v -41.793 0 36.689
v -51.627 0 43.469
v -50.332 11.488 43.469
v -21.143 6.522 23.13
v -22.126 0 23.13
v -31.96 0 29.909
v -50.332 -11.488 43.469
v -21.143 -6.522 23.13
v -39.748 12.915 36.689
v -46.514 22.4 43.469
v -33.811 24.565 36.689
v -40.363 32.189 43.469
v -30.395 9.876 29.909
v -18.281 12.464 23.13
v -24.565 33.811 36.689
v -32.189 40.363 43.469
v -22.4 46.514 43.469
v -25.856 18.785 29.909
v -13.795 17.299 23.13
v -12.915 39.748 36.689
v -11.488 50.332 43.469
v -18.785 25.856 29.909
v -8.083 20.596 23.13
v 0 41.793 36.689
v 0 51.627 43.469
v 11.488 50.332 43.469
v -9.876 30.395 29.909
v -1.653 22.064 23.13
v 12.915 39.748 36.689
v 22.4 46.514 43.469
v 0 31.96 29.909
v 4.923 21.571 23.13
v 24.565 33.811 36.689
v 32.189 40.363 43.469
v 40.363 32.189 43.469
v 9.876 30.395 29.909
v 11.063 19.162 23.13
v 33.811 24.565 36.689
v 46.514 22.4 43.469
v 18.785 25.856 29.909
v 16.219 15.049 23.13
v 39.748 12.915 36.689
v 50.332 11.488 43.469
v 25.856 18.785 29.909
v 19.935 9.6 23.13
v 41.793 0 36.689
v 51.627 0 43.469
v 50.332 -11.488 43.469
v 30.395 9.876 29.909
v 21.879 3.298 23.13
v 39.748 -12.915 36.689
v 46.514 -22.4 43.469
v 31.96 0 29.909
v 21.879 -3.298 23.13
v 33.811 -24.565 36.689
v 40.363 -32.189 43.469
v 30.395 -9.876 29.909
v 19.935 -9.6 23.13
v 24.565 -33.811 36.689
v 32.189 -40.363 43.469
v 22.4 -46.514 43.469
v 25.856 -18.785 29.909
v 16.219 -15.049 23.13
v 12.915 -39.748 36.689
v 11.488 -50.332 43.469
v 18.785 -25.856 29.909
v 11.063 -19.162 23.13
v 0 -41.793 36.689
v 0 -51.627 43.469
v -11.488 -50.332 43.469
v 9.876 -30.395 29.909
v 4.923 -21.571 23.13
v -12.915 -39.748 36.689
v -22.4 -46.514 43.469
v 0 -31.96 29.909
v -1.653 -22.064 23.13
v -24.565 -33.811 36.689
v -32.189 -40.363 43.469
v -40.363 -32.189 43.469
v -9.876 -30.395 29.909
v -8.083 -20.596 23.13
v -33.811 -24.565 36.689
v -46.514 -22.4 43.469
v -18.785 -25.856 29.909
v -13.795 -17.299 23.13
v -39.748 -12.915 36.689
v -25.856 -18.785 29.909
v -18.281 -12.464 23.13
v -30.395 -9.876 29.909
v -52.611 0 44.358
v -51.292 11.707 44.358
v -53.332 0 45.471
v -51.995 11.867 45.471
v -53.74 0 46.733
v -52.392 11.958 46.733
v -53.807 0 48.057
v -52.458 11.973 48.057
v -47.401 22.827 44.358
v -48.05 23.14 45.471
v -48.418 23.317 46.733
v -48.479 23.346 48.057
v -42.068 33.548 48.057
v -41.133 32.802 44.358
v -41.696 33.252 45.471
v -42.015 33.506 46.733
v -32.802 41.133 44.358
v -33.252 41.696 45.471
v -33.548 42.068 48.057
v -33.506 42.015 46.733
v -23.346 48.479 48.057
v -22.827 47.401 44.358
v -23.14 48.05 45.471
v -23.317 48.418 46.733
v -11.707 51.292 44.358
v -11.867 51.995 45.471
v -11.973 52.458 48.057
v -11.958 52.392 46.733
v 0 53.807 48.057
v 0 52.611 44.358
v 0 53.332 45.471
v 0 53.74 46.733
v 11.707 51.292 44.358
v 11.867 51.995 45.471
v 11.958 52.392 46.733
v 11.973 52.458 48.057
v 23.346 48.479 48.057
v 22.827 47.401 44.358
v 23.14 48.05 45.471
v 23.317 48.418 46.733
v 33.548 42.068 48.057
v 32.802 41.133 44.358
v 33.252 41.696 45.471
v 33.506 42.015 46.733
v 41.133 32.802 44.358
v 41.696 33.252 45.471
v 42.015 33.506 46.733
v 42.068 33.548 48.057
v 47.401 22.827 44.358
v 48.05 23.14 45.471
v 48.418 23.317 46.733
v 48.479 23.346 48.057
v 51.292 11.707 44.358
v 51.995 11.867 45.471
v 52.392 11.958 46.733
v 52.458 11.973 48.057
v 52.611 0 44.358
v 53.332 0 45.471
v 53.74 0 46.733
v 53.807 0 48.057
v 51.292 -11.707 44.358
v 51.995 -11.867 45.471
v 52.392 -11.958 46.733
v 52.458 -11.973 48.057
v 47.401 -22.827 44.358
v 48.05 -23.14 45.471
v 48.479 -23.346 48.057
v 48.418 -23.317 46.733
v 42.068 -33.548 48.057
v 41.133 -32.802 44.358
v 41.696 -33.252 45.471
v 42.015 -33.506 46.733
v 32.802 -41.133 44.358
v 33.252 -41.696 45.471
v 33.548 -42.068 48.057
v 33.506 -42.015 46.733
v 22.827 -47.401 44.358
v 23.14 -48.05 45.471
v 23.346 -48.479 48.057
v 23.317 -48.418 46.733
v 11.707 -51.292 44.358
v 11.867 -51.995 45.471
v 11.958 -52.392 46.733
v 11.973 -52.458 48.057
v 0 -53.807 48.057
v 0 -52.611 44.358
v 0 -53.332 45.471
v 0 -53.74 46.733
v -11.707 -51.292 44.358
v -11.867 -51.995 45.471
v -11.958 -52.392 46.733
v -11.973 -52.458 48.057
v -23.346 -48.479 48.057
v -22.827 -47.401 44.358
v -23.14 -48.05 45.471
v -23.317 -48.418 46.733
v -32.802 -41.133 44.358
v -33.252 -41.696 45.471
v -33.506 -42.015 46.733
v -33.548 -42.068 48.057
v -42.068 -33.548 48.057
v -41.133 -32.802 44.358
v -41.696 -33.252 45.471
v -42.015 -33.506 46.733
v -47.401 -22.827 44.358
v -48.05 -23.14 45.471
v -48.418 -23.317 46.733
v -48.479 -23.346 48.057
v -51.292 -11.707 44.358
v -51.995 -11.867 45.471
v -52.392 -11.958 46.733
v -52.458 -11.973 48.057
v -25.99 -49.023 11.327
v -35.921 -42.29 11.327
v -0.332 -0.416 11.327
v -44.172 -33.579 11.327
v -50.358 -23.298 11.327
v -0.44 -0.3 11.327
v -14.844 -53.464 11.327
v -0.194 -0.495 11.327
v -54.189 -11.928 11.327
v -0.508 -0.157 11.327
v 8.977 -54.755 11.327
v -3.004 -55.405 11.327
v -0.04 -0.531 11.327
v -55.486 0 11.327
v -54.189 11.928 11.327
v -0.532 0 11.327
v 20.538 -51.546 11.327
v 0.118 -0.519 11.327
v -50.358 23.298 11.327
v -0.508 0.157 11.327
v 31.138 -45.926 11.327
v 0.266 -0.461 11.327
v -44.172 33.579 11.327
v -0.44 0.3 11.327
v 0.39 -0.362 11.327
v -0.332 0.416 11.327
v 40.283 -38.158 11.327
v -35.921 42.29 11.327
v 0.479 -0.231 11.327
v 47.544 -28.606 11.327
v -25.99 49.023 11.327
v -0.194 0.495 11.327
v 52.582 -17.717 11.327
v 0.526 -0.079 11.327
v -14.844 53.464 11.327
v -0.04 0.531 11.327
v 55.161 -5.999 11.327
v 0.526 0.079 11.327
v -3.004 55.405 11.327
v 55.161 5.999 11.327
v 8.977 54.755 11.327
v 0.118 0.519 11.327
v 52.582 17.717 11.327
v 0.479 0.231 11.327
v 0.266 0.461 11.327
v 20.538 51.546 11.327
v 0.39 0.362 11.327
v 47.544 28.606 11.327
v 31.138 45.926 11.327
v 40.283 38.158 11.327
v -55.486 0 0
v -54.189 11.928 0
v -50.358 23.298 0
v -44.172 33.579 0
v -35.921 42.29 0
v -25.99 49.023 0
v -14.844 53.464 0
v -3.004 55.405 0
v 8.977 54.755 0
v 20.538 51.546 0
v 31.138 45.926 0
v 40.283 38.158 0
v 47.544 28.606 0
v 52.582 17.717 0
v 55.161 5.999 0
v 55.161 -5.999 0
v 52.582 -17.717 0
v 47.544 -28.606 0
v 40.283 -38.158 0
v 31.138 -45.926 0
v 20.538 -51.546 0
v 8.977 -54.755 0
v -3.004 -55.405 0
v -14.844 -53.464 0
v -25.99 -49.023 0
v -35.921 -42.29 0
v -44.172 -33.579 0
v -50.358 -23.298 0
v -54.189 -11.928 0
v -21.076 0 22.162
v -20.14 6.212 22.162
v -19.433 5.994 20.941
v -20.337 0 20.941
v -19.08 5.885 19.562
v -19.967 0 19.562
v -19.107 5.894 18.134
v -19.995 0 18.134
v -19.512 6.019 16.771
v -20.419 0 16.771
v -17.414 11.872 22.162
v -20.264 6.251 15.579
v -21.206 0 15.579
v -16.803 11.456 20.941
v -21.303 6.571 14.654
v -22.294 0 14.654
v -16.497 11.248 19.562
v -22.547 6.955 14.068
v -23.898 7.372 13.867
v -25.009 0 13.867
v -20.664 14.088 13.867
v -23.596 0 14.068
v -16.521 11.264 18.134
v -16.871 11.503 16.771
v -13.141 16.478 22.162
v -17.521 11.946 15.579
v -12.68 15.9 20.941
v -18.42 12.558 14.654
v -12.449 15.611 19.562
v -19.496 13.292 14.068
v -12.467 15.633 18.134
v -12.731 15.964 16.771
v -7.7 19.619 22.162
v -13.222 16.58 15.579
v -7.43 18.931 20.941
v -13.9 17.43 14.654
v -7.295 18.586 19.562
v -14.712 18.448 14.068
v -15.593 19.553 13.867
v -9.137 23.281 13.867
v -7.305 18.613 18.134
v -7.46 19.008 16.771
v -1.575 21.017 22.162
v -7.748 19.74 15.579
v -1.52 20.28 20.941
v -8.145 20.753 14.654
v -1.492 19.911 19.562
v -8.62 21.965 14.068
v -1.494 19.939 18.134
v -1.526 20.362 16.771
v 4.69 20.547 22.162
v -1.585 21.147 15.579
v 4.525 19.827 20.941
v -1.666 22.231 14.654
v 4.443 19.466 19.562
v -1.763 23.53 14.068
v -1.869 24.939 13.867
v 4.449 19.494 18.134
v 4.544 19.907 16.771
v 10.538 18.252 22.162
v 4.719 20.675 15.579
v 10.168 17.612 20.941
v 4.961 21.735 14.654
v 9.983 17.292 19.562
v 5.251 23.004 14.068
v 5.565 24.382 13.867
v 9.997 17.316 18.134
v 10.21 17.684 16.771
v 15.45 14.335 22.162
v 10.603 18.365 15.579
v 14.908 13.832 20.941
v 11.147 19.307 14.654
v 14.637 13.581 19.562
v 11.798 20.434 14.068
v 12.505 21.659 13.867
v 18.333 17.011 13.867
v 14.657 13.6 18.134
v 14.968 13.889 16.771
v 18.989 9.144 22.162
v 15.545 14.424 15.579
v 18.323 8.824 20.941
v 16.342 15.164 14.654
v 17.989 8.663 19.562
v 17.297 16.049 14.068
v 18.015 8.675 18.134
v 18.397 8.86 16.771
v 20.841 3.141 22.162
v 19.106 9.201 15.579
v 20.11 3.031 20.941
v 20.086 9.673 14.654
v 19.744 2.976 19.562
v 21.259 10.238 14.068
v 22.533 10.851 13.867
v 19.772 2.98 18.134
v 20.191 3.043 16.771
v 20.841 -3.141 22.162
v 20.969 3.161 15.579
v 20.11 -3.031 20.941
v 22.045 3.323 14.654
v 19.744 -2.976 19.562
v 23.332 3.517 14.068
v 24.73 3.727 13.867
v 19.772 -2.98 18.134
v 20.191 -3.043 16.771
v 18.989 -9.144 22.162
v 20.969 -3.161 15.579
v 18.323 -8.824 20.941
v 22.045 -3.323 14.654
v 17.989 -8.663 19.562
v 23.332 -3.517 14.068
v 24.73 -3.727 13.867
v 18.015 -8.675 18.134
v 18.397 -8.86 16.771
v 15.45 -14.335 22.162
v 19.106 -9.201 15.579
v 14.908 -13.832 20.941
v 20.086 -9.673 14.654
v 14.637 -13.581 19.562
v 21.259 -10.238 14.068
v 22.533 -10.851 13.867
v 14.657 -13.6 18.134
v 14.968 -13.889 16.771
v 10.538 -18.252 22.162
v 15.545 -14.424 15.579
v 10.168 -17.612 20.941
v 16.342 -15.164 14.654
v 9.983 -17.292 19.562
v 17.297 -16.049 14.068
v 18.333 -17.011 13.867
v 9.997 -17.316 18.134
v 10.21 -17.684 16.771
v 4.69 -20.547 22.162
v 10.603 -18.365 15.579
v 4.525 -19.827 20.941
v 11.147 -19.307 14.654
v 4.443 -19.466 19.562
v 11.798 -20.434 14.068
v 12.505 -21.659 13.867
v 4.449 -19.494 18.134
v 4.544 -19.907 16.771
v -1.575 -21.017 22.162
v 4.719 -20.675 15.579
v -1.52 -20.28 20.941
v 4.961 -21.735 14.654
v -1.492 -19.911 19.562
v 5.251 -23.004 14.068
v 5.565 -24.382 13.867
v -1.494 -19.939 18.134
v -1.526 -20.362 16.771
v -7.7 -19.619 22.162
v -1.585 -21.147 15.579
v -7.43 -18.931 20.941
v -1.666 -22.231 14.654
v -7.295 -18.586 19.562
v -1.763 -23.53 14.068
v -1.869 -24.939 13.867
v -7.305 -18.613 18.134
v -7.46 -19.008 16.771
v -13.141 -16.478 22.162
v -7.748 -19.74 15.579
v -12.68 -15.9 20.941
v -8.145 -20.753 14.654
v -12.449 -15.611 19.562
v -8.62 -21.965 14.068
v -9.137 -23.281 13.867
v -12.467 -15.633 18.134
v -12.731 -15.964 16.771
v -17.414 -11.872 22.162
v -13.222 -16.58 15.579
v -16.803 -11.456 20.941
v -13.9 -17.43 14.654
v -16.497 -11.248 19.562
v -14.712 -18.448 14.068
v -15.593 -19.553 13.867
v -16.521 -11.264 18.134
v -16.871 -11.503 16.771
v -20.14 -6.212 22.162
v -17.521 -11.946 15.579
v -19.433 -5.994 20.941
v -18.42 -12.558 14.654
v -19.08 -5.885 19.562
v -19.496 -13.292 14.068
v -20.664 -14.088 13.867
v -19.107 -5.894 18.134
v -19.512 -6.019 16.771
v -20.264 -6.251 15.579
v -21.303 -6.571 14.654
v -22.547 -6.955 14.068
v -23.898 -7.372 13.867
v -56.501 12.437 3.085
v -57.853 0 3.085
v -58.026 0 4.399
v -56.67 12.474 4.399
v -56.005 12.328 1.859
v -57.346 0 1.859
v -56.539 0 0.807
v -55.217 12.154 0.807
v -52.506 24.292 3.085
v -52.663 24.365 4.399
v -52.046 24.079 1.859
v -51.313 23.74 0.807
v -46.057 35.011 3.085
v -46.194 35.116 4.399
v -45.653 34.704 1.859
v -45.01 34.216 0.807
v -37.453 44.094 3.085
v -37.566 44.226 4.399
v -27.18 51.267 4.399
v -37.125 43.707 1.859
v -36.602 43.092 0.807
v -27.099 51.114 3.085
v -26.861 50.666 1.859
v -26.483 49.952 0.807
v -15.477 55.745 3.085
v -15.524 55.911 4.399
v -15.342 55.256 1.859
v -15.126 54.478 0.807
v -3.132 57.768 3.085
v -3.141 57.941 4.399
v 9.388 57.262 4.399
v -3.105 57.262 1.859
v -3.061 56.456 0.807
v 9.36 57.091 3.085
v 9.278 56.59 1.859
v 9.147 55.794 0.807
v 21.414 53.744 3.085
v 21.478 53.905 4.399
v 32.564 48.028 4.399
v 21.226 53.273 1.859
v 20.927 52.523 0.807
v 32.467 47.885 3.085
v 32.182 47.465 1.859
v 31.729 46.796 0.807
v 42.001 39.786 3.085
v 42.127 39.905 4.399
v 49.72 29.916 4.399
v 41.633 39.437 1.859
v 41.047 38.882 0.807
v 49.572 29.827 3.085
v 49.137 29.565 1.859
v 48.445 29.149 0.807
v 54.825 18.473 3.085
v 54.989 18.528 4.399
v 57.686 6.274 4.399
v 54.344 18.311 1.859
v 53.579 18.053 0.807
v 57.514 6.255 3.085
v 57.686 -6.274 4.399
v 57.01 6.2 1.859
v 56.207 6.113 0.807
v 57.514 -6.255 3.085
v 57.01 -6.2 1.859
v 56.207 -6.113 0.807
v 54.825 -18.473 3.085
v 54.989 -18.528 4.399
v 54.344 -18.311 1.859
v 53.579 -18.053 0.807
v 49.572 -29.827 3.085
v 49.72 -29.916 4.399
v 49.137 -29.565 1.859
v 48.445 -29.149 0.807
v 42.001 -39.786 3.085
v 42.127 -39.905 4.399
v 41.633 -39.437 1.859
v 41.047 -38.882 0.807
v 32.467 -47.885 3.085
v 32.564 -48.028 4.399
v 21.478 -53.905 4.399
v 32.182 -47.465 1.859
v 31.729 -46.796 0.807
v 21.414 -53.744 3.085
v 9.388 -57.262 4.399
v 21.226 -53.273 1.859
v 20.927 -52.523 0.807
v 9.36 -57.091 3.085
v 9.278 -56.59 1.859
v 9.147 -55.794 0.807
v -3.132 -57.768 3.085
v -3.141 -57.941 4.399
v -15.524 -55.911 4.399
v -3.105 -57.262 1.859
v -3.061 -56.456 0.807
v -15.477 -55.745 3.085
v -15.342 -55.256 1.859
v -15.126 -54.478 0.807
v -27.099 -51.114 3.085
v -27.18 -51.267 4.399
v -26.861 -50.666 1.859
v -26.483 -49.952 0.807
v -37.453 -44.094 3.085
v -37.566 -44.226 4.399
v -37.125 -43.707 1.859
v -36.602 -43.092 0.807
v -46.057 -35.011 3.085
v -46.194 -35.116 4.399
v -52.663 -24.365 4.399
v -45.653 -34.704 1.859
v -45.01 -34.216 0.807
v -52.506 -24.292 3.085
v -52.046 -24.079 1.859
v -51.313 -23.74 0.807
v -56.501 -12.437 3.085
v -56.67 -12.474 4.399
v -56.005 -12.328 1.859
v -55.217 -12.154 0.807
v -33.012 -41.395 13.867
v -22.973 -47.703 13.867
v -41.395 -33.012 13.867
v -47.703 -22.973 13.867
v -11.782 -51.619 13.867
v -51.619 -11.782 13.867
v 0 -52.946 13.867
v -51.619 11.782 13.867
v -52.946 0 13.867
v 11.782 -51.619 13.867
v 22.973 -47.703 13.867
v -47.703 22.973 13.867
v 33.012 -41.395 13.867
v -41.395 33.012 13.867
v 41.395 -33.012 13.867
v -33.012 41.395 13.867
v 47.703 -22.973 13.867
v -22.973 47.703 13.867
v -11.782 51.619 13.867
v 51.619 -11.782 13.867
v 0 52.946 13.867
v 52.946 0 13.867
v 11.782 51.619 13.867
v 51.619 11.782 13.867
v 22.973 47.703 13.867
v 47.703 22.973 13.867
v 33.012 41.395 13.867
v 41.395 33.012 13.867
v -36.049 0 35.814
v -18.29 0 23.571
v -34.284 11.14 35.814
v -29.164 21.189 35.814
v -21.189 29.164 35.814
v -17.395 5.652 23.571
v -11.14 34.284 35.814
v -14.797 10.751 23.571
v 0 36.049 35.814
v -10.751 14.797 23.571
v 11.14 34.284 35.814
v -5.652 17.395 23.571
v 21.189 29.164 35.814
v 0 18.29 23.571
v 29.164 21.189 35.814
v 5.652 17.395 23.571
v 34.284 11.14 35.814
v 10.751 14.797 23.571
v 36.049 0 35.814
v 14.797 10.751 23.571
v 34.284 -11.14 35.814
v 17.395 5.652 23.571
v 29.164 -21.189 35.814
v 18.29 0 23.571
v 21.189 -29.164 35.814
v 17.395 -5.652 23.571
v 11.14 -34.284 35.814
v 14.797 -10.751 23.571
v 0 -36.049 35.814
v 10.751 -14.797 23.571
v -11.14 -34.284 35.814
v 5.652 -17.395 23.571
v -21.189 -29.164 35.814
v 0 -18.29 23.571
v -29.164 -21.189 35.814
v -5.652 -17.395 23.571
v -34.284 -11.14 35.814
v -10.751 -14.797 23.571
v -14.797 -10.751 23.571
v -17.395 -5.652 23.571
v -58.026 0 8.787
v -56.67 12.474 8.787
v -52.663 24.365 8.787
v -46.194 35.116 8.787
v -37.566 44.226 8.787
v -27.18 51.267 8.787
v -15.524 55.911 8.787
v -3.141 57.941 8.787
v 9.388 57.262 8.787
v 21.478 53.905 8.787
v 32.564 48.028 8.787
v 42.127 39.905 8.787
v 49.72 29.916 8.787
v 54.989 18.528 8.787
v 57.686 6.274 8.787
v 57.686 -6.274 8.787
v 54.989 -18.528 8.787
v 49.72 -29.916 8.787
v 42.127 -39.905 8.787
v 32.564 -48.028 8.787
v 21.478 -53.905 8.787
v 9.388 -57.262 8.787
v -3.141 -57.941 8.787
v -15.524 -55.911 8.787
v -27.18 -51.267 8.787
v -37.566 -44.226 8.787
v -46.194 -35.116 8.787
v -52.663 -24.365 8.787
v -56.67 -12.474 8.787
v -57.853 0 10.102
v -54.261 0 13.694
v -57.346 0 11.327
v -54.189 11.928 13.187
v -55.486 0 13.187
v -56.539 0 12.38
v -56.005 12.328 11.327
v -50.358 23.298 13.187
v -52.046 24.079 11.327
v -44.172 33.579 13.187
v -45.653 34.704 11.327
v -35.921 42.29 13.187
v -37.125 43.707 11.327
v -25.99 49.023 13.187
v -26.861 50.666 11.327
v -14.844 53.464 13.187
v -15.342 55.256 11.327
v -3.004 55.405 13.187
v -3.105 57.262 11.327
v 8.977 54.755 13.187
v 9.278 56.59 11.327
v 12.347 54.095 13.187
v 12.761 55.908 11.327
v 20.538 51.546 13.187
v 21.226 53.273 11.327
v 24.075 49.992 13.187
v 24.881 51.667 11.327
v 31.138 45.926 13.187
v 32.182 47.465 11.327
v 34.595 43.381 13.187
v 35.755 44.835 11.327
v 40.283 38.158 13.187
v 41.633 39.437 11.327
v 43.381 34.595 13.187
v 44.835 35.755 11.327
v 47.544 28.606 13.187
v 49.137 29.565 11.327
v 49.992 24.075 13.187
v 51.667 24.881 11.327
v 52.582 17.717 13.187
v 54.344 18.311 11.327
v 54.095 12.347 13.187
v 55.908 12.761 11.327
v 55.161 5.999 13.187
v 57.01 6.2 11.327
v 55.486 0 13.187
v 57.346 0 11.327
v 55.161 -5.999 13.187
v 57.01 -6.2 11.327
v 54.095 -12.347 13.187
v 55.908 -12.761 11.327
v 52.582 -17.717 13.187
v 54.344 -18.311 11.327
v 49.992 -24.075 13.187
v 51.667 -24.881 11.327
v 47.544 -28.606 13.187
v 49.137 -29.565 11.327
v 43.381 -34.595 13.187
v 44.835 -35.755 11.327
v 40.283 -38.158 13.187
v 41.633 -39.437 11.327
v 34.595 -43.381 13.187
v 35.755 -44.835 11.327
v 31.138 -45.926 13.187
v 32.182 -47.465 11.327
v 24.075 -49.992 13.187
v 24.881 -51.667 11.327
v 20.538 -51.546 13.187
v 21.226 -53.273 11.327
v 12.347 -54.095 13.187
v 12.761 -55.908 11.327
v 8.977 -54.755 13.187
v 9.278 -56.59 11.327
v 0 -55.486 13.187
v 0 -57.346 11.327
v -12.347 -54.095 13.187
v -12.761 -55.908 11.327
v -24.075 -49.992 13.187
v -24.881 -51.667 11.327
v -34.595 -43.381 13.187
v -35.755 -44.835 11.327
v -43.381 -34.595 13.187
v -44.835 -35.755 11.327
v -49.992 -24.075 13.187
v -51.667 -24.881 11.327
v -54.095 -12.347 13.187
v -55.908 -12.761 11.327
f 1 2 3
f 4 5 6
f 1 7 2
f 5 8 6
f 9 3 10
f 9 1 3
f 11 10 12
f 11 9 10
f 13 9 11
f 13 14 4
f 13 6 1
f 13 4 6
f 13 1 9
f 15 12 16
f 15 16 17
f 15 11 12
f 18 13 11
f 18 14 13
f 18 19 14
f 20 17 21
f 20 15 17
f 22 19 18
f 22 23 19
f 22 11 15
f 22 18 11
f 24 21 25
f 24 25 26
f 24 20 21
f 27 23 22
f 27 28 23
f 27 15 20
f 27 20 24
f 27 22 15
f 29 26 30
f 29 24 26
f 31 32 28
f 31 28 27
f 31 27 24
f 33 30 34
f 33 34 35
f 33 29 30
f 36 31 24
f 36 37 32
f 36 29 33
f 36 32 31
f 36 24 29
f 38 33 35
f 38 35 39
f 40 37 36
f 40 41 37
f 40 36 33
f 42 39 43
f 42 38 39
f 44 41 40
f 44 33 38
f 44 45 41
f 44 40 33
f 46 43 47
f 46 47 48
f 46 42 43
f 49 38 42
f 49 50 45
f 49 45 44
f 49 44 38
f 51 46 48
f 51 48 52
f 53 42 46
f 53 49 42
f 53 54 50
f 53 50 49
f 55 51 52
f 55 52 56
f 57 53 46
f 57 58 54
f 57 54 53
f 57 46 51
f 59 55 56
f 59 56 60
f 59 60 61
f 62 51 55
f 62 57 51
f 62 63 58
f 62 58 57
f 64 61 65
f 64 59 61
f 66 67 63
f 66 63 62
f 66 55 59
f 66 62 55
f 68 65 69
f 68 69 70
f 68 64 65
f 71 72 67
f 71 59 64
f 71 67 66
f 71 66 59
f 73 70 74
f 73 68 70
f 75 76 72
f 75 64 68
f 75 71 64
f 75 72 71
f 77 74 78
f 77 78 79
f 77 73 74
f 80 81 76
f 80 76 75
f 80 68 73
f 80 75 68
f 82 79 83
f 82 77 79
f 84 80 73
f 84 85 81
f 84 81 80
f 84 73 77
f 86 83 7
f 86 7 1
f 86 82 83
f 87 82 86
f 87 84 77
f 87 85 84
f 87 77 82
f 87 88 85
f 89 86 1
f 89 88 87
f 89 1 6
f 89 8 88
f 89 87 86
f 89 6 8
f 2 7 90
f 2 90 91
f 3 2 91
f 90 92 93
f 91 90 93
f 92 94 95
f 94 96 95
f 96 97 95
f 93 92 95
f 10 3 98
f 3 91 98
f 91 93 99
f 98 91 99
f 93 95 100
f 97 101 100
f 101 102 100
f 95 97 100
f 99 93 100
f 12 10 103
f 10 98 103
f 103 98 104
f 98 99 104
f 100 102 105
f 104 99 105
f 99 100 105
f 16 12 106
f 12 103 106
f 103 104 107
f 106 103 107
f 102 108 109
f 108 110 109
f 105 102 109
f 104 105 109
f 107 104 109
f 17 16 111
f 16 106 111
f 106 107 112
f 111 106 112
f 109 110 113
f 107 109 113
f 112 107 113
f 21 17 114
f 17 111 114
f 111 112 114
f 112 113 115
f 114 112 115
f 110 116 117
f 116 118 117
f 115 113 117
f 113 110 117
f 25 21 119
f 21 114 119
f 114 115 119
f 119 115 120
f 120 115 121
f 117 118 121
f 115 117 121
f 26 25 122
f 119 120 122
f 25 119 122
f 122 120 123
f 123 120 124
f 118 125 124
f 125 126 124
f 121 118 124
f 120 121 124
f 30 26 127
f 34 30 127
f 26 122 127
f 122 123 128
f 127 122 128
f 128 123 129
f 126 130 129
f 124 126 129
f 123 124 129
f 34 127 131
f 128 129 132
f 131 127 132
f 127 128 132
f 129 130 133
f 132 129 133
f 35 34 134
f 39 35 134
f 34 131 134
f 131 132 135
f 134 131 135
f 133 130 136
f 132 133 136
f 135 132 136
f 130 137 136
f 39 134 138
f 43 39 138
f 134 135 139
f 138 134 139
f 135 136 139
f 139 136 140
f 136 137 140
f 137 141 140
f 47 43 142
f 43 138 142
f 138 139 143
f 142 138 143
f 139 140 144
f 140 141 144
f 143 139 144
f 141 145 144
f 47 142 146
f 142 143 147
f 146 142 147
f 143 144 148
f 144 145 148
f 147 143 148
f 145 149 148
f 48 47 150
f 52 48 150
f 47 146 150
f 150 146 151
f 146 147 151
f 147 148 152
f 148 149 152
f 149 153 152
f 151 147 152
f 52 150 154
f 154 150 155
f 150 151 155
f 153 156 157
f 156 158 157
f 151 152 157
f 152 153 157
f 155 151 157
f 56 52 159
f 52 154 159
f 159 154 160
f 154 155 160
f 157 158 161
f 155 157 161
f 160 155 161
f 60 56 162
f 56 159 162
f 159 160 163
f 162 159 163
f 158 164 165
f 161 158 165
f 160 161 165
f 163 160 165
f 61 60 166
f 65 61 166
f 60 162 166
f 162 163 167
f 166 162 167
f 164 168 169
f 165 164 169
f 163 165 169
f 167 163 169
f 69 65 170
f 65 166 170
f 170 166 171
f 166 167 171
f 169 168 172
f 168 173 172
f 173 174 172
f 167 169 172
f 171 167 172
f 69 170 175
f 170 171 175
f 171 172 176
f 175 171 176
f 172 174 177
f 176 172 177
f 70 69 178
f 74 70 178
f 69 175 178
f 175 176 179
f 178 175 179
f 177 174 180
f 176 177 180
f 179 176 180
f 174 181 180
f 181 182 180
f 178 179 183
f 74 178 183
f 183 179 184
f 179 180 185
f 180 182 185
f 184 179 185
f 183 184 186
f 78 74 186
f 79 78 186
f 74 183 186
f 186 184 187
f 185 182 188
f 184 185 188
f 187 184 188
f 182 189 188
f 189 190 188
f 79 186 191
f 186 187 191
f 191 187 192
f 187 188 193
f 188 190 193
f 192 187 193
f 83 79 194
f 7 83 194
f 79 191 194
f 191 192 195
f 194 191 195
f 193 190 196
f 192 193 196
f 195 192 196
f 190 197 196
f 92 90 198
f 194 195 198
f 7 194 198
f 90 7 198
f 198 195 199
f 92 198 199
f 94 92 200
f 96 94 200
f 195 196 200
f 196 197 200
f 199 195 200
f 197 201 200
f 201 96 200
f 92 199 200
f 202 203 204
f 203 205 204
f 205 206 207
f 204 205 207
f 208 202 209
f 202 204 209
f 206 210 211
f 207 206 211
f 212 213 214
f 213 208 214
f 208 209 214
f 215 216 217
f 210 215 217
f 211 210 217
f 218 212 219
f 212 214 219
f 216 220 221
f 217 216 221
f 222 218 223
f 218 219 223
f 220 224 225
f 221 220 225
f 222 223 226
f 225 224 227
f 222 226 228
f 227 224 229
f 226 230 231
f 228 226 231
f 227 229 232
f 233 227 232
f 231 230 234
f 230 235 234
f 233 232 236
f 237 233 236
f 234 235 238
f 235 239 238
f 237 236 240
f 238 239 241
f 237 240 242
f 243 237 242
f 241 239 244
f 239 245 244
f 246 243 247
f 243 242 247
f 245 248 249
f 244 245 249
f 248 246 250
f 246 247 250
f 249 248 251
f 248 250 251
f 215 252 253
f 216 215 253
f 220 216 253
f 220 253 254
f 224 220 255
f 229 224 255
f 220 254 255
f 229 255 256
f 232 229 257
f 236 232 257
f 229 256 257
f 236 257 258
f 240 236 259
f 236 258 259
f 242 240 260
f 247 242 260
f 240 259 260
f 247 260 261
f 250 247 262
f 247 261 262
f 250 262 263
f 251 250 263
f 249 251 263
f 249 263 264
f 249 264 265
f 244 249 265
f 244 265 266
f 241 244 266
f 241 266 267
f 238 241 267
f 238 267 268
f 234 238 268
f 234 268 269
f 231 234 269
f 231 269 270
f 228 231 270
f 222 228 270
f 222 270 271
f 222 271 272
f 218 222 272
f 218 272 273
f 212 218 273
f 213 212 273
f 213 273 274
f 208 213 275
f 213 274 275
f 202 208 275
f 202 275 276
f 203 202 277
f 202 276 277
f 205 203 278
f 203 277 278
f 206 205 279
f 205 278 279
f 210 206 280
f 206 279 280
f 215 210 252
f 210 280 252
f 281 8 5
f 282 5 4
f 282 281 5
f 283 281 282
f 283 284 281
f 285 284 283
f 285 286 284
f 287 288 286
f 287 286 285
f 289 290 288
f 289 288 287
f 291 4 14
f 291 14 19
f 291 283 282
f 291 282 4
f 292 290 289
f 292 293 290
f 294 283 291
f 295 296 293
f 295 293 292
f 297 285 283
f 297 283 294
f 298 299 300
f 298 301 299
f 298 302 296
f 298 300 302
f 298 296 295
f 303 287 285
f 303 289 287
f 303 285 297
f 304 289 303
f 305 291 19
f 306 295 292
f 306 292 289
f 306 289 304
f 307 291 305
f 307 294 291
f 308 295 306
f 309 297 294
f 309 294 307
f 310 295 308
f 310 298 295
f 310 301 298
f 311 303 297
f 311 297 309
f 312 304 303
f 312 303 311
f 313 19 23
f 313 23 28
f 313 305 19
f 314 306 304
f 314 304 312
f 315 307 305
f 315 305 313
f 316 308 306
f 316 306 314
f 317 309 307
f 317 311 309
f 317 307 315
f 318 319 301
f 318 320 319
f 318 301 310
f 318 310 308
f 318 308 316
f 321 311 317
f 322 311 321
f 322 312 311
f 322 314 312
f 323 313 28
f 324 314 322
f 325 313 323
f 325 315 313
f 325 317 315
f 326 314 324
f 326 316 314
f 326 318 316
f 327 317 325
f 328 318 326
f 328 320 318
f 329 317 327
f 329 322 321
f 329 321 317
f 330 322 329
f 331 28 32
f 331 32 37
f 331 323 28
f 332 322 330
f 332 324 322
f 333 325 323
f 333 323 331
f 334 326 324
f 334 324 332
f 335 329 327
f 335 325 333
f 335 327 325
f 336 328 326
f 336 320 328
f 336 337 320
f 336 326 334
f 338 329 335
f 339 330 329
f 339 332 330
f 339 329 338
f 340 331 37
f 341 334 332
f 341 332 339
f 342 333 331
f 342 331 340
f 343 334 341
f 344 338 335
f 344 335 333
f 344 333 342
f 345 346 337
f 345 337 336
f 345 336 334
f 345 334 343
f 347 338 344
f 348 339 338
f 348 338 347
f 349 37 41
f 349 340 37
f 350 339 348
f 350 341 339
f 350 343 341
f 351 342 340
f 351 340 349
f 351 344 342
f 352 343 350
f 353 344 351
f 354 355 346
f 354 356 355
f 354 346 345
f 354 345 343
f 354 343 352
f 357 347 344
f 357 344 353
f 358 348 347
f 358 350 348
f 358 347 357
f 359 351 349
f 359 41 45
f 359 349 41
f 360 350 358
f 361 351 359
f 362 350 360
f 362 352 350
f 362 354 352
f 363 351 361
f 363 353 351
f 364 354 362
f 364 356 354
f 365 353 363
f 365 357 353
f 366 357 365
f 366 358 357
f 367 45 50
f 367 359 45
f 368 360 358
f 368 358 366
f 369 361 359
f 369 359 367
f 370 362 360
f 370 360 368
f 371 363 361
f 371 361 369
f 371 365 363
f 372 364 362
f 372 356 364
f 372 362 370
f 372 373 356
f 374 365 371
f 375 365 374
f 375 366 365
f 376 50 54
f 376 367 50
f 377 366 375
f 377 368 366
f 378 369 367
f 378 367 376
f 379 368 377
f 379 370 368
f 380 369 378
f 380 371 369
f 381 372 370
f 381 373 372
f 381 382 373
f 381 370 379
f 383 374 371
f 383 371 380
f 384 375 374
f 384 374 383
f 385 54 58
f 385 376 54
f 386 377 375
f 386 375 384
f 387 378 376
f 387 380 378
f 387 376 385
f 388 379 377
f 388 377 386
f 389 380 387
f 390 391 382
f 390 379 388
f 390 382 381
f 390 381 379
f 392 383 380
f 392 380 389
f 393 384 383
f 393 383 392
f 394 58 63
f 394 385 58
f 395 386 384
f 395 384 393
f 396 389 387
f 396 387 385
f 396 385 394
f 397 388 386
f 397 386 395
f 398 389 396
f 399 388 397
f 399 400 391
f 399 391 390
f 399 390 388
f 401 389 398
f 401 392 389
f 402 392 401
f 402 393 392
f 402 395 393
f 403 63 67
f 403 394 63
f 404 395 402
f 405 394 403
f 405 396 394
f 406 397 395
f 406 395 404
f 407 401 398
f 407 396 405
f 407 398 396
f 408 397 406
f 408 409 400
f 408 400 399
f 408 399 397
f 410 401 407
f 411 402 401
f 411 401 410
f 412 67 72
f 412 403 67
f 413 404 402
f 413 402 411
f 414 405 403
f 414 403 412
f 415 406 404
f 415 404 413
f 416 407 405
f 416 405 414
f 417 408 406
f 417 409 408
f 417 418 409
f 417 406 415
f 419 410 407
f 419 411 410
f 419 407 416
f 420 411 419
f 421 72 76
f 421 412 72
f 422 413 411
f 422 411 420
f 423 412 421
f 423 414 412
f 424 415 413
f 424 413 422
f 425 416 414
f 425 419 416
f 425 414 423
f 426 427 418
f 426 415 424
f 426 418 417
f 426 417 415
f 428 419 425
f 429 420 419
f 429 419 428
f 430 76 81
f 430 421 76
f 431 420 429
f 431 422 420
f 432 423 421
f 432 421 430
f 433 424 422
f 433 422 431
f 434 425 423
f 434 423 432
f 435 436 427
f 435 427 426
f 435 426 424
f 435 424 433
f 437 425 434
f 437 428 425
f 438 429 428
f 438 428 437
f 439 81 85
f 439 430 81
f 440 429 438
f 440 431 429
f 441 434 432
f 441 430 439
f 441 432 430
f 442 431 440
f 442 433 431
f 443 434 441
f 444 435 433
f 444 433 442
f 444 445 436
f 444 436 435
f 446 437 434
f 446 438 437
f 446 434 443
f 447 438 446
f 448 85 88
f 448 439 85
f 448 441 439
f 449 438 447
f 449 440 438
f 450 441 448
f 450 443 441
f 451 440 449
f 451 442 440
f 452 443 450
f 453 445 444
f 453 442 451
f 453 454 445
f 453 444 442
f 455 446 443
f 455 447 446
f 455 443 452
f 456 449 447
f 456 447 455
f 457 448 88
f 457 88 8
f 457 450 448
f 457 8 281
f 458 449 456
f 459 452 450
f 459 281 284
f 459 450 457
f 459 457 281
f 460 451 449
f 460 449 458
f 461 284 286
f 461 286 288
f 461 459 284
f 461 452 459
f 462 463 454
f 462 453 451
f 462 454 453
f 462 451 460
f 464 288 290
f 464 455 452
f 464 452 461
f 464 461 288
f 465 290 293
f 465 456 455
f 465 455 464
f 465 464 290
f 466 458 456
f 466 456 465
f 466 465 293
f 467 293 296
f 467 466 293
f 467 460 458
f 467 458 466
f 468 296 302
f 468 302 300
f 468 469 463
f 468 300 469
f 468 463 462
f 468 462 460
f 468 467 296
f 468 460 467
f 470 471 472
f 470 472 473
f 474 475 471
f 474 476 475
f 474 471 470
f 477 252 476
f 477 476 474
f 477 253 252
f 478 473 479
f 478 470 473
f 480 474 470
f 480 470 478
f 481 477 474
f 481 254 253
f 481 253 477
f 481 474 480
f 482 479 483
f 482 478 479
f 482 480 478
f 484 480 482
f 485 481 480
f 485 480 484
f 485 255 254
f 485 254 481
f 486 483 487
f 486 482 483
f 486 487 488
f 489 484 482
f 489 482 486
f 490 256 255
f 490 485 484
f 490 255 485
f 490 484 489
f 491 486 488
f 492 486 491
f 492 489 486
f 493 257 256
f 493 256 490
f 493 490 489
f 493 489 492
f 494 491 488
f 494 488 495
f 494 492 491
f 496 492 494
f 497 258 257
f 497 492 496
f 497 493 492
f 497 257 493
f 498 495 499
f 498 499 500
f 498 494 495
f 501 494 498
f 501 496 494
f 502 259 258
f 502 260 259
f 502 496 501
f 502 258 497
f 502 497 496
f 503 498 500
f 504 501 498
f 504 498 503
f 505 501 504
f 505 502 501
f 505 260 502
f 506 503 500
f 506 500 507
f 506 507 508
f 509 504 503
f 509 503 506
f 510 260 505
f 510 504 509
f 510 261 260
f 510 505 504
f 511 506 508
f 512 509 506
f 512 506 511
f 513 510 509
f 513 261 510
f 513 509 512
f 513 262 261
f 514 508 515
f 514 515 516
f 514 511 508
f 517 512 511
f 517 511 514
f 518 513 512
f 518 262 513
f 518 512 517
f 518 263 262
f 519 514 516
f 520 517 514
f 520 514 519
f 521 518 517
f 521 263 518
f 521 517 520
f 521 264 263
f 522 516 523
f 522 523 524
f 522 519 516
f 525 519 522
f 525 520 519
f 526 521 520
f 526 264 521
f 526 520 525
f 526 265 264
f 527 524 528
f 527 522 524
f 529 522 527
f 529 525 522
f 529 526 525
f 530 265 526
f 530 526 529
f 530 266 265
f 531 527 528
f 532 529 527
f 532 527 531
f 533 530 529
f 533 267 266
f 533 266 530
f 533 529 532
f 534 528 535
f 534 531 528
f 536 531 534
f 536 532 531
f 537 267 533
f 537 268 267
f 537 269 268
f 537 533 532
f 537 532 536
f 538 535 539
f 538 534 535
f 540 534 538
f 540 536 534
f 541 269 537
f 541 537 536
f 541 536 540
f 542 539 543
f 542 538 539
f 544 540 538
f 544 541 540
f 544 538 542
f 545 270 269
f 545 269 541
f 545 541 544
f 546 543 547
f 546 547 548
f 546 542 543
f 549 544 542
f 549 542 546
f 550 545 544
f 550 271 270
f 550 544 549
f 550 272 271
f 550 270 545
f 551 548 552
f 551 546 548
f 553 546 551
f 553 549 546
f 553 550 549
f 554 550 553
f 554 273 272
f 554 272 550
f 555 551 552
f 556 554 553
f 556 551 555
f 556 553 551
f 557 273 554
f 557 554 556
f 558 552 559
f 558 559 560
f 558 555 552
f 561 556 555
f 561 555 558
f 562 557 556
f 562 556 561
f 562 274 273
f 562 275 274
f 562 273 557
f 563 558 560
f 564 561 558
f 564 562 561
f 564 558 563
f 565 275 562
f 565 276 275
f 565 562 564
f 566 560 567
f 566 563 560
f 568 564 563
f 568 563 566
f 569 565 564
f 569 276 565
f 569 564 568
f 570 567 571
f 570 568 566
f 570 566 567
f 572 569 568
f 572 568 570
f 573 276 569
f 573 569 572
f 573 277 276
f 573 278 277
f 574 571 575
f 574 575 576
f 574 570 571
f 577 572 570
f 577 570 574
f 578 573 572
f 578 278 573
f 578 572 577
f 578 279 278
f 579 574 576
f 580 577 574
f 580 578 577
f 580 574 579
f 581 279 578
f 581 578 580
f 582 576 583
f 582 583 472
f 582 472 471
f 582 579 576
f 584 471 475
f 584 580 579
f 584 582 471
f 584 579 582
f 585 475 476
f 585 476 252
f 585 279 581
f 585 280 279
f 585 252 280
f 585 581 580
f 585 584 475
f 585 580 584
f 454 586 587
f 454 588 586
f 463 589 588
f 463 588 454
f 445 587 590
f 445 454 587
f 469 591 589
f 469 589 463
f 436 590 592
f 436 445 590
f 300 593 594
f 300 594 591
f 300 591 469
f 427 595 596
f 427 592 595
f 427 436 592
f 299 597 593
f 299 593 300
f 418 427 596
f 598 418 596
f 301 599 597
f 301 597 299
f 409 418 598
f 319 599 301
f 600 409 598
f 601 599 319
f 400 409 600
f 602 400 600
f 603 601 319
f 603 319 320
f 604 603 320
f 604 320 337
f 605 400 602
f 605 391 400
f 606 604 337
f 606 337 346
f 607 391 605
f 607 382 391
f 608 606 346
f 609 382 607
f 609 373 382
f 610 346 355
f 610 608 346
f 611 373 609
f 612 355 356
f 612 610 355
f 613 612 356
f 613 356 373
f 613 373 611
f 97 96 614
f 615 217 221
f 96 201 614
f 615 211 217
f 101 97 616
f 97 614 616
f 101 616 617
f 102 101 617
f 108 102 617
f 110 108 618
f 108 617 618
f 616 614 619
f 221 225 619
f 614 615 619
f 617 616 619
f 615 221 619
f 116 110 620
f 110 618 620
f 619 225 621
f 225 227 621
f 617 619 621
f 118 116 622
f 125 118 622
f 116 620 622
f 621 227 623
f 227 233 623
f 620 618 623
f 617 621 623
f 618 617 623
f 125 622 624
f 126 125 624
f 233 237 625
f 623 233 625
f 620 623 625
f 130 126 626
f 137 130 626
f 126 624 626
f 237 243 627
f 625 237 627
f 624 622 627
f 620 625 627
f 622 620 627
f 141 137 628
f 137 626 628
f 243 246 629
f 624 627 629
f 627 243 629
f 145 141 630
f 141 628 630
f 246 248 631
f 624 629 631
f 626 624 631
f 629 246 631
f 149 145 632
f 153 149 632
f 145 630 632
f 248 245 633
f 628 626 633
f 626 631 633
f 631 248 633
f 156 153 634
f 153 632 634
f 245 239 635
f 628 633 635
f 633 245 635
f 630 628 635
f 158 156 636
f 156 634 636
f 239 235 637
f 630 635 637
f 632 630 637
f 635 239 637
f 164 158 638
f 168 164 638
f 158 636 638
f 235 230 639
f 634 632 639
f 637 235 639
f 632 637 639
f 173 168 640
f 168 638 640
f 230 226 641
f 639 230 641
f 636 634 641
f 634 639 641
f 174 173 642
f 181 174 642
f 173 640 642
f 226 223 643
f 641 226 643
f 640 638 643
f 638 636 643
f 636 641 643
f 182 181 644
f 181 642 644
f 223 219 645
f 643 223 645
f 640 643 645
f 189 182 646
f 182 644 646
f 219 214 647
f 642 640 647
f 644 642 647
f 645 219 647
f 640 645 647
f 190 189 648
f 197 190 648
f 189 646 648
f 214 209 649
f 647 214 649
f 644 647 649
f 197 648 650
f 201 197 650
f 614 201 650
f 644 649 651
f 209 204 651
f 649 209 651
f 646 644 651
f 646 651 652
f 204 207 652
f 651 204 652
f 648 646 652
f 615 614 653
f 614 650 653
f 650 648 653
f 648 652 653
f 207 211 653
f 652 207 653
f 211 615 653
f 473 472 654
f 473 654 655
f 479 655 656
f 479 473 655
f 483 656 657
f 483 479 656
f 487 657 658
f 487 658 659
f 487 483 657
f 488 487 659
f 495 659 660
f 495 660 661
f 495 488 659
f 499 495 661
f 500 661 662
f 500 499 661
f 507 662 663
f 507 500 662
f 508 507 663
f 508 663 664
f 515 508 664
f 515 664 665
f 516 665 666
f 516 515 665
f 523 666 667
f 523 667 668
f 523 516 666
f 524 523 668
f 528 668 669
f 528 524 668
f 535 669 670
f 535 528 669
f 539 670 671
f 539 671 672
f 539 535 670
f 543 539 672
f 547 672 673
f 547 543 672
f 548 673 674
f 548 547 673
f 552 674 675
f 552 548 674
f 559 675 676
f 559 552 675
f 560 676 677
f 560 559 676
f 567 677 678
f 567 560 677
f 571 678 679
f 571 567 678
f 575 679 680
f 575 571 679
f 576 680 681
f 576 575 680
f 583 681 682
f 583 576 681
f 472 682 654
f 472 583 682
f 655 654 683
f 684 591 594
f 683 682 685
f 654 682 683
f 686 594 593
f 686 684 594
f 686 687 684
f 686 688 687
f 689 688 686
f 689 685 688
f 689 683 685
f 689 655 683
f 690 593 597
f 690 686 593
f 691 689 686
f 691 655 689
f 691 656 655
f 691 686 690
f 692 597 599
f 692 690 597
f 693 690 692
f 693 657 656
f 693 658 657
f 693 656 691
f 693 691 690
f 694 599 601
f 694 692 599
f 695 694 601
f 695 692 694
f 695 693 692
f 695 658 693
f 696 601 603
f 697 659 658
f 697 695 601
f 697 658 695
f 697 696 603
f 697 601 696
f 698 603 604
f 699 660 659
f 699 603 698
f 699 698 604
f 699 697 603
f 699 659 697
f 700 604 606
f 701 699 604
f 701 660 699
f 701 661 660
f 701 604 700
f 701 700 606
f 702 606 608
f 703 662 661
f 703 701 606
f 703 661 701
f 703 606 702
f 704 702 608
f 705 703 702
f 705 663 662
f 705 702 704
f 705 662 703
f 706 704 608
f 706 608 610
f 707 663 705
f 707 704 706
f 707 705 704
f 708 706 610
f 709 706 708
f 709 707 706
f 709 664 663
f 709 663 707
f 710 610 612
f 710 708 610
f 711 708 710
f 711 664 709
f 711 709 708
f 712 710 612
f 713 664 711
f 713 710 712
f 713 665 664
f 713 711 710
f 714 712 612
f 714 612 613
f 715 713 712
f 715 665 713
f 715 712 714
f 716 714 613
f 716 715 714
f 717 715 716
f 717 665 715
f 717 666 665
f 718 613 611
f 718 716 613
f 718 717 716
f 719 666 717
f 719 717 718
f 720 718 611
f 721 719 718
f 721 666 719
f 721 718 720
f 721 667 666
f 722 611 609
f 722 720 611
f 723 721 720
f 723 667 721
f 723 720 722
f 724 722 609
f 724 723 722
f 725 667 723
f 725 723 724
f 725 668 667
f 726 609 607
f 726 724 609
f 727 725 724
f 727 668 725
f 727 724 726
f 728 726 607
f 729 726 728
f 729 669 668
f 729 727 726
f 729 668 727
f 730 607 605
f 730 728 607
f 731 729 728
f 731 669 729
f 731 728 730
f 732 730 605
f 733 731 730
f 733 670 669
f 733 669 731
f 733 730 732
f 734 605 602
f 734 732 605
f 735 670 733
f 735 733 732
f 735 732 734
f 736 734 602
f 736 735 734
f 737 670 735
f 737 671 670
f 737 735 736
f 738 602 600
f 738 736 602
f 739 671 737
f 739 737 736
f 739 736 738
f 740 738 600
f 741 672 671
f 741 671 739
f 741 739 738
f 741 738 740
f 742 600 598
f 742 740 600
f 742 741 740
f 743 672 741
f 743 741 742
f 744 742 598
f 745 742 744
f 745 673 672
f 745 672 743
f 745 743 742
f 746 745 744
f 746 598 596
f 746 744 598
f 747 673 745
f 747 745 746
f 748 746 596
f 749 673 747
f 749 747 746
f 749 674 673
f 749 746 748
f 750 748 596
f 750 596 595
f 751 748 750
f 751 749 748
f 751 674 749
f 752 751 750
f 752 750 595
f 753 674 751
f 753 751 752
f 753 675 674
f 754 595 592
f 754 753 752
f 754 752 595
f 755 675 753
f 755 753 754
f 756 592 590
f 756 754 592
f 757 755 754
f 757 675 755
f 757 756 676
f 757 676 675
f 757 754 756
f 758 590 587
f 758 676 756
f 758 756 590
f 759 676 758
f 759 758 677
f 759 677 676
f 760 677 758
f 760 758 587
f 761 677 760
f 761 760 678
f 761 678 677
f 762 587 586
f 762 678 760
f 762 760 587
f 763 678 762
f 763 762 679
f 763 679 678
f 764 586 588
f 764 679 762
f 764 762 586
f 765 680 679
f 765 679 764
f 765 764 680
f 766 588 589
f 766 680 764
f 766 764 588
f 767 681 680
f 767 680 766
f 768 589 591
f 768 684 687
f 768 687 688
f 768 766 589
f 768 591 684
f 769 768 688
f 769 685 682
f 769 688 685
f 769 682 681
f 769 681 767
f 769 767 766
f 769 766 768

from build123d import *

# Parameters (mm, degrees)
F2_T = -2.54


# Not quite as in the source:
# - a fillet or chamfer that OpenCascade refuses, or shapes differently, is made with other operations: its cross-section is extruded or revolved along the edge and cut away or added


with BuildPart() as f1:
    # F0 (on Front) → F1 (revolve)
    with BuildSketch(Plane.XZ):
        Polygon((-8.6911804974, 13.8674174355), (0, 13.8674174355), (0, 48.0571240187), (-58.2820437849, 48.0571240187), align=None)
        Polygon((-58.0264218152, 0), (0, 0), (0, 13.8674174355), (-8.6911804974, 13.8674174355), (-58.0264218152, 13.8674174355), align=None)
    revolve(axis=Axis((0, 0, 30.9622707271), (0, 0, -1)))

    # F2
    f2_openings = [f1.faces().sort_by_distance(p)[0] for p in [
        (0, 0, 48.057124),
        (0, 0, 0),
    ]]
    offset(amount=F2_T, openings=f2_openings, kind=Kind.INTERSECTION)

    # F3: fillet of radius 5.08 on 6 edges, made by hand

    # F3_s1 → F3_t2 (revolve)
    with BuildSketch(Plane.XZ):
        with BuildLine():
            ThreePointArc((-22.1258654795, 23.1297675365), (-20.1589276546, 17.4374403683), (-25.0093265306, 13.8674174355))
            Line((-25.0093265306, 13.8674174355), (-8.6911804974, 13.8674174355))
            Line((-8.6911804974, 13.8674174355), (-22.1258654795, 23.1297675365))
        make_face()
    revolve(axis=Axis((0, 0, 13.8674174355), (0, 0, -1)))

    # F3_s3 → F3_t4 (revolve, cut)
    with BuildSketch(Plane.XZ):
        with BuildLine():
            ThreePointArc((-51.6268528261, 43.4687984471), (-53.3317173465, 45.4708576387), (-53.8071437354, 48.0571240187))
            Line((-53.8071437354, 48.0571240187), (-58.2820437849, 48.0571240187))
            Line((-58.2820437849, 48.0571240187), (-51.6268528261, 43.4687984471))
        make_face()
    revolve(axis=Axis((0, 0, 48.0571240187), (0, 0, -1)), mode=Mode.SUBTRACT)

    # F3_s5 → F3_t6 (revolve, cut)
    with BuildSketch(Plane.XZ):
        with BuildLine():
            ThreePointArc((-52.9464218152, 13.8674174355), (-56.5385242636, 12.3795198839), (-58.0264218152, 8.7874174355))
            Line((-58.0264218152, 8.7874174355), (-58.0264218152, 13.8674174355))
            Line((-58.0264218152, 13.8674174355), (-52.9464218152, 13.8674174355))
        make_face()
    revolve(axis=Axis((0, 0, 13.8674174355), (0, 0, -1)), mode=Mode.SUBTRACT)

    # F3_s7 → F3_t8 (revolve, cut)
    with BuildSketch(Plane.XZ):
        with BuildLine():
            ThreePointArc((-58.0264218152, 4.3994090512), (-57.3458308664, 1.8594090512), (-55.4864218152, 0))
            Line((-55.4864218152, 0), (-58.0264218152, 0))
            Line((-58.0264218152, 0), (-58.0264218152, 4.3994090512))
        make_face()
    revolve(axis=Axis((0, 0, 0), (0, 0, -1)), mode=Mode.SUBTRACT)


solid = f1.part
